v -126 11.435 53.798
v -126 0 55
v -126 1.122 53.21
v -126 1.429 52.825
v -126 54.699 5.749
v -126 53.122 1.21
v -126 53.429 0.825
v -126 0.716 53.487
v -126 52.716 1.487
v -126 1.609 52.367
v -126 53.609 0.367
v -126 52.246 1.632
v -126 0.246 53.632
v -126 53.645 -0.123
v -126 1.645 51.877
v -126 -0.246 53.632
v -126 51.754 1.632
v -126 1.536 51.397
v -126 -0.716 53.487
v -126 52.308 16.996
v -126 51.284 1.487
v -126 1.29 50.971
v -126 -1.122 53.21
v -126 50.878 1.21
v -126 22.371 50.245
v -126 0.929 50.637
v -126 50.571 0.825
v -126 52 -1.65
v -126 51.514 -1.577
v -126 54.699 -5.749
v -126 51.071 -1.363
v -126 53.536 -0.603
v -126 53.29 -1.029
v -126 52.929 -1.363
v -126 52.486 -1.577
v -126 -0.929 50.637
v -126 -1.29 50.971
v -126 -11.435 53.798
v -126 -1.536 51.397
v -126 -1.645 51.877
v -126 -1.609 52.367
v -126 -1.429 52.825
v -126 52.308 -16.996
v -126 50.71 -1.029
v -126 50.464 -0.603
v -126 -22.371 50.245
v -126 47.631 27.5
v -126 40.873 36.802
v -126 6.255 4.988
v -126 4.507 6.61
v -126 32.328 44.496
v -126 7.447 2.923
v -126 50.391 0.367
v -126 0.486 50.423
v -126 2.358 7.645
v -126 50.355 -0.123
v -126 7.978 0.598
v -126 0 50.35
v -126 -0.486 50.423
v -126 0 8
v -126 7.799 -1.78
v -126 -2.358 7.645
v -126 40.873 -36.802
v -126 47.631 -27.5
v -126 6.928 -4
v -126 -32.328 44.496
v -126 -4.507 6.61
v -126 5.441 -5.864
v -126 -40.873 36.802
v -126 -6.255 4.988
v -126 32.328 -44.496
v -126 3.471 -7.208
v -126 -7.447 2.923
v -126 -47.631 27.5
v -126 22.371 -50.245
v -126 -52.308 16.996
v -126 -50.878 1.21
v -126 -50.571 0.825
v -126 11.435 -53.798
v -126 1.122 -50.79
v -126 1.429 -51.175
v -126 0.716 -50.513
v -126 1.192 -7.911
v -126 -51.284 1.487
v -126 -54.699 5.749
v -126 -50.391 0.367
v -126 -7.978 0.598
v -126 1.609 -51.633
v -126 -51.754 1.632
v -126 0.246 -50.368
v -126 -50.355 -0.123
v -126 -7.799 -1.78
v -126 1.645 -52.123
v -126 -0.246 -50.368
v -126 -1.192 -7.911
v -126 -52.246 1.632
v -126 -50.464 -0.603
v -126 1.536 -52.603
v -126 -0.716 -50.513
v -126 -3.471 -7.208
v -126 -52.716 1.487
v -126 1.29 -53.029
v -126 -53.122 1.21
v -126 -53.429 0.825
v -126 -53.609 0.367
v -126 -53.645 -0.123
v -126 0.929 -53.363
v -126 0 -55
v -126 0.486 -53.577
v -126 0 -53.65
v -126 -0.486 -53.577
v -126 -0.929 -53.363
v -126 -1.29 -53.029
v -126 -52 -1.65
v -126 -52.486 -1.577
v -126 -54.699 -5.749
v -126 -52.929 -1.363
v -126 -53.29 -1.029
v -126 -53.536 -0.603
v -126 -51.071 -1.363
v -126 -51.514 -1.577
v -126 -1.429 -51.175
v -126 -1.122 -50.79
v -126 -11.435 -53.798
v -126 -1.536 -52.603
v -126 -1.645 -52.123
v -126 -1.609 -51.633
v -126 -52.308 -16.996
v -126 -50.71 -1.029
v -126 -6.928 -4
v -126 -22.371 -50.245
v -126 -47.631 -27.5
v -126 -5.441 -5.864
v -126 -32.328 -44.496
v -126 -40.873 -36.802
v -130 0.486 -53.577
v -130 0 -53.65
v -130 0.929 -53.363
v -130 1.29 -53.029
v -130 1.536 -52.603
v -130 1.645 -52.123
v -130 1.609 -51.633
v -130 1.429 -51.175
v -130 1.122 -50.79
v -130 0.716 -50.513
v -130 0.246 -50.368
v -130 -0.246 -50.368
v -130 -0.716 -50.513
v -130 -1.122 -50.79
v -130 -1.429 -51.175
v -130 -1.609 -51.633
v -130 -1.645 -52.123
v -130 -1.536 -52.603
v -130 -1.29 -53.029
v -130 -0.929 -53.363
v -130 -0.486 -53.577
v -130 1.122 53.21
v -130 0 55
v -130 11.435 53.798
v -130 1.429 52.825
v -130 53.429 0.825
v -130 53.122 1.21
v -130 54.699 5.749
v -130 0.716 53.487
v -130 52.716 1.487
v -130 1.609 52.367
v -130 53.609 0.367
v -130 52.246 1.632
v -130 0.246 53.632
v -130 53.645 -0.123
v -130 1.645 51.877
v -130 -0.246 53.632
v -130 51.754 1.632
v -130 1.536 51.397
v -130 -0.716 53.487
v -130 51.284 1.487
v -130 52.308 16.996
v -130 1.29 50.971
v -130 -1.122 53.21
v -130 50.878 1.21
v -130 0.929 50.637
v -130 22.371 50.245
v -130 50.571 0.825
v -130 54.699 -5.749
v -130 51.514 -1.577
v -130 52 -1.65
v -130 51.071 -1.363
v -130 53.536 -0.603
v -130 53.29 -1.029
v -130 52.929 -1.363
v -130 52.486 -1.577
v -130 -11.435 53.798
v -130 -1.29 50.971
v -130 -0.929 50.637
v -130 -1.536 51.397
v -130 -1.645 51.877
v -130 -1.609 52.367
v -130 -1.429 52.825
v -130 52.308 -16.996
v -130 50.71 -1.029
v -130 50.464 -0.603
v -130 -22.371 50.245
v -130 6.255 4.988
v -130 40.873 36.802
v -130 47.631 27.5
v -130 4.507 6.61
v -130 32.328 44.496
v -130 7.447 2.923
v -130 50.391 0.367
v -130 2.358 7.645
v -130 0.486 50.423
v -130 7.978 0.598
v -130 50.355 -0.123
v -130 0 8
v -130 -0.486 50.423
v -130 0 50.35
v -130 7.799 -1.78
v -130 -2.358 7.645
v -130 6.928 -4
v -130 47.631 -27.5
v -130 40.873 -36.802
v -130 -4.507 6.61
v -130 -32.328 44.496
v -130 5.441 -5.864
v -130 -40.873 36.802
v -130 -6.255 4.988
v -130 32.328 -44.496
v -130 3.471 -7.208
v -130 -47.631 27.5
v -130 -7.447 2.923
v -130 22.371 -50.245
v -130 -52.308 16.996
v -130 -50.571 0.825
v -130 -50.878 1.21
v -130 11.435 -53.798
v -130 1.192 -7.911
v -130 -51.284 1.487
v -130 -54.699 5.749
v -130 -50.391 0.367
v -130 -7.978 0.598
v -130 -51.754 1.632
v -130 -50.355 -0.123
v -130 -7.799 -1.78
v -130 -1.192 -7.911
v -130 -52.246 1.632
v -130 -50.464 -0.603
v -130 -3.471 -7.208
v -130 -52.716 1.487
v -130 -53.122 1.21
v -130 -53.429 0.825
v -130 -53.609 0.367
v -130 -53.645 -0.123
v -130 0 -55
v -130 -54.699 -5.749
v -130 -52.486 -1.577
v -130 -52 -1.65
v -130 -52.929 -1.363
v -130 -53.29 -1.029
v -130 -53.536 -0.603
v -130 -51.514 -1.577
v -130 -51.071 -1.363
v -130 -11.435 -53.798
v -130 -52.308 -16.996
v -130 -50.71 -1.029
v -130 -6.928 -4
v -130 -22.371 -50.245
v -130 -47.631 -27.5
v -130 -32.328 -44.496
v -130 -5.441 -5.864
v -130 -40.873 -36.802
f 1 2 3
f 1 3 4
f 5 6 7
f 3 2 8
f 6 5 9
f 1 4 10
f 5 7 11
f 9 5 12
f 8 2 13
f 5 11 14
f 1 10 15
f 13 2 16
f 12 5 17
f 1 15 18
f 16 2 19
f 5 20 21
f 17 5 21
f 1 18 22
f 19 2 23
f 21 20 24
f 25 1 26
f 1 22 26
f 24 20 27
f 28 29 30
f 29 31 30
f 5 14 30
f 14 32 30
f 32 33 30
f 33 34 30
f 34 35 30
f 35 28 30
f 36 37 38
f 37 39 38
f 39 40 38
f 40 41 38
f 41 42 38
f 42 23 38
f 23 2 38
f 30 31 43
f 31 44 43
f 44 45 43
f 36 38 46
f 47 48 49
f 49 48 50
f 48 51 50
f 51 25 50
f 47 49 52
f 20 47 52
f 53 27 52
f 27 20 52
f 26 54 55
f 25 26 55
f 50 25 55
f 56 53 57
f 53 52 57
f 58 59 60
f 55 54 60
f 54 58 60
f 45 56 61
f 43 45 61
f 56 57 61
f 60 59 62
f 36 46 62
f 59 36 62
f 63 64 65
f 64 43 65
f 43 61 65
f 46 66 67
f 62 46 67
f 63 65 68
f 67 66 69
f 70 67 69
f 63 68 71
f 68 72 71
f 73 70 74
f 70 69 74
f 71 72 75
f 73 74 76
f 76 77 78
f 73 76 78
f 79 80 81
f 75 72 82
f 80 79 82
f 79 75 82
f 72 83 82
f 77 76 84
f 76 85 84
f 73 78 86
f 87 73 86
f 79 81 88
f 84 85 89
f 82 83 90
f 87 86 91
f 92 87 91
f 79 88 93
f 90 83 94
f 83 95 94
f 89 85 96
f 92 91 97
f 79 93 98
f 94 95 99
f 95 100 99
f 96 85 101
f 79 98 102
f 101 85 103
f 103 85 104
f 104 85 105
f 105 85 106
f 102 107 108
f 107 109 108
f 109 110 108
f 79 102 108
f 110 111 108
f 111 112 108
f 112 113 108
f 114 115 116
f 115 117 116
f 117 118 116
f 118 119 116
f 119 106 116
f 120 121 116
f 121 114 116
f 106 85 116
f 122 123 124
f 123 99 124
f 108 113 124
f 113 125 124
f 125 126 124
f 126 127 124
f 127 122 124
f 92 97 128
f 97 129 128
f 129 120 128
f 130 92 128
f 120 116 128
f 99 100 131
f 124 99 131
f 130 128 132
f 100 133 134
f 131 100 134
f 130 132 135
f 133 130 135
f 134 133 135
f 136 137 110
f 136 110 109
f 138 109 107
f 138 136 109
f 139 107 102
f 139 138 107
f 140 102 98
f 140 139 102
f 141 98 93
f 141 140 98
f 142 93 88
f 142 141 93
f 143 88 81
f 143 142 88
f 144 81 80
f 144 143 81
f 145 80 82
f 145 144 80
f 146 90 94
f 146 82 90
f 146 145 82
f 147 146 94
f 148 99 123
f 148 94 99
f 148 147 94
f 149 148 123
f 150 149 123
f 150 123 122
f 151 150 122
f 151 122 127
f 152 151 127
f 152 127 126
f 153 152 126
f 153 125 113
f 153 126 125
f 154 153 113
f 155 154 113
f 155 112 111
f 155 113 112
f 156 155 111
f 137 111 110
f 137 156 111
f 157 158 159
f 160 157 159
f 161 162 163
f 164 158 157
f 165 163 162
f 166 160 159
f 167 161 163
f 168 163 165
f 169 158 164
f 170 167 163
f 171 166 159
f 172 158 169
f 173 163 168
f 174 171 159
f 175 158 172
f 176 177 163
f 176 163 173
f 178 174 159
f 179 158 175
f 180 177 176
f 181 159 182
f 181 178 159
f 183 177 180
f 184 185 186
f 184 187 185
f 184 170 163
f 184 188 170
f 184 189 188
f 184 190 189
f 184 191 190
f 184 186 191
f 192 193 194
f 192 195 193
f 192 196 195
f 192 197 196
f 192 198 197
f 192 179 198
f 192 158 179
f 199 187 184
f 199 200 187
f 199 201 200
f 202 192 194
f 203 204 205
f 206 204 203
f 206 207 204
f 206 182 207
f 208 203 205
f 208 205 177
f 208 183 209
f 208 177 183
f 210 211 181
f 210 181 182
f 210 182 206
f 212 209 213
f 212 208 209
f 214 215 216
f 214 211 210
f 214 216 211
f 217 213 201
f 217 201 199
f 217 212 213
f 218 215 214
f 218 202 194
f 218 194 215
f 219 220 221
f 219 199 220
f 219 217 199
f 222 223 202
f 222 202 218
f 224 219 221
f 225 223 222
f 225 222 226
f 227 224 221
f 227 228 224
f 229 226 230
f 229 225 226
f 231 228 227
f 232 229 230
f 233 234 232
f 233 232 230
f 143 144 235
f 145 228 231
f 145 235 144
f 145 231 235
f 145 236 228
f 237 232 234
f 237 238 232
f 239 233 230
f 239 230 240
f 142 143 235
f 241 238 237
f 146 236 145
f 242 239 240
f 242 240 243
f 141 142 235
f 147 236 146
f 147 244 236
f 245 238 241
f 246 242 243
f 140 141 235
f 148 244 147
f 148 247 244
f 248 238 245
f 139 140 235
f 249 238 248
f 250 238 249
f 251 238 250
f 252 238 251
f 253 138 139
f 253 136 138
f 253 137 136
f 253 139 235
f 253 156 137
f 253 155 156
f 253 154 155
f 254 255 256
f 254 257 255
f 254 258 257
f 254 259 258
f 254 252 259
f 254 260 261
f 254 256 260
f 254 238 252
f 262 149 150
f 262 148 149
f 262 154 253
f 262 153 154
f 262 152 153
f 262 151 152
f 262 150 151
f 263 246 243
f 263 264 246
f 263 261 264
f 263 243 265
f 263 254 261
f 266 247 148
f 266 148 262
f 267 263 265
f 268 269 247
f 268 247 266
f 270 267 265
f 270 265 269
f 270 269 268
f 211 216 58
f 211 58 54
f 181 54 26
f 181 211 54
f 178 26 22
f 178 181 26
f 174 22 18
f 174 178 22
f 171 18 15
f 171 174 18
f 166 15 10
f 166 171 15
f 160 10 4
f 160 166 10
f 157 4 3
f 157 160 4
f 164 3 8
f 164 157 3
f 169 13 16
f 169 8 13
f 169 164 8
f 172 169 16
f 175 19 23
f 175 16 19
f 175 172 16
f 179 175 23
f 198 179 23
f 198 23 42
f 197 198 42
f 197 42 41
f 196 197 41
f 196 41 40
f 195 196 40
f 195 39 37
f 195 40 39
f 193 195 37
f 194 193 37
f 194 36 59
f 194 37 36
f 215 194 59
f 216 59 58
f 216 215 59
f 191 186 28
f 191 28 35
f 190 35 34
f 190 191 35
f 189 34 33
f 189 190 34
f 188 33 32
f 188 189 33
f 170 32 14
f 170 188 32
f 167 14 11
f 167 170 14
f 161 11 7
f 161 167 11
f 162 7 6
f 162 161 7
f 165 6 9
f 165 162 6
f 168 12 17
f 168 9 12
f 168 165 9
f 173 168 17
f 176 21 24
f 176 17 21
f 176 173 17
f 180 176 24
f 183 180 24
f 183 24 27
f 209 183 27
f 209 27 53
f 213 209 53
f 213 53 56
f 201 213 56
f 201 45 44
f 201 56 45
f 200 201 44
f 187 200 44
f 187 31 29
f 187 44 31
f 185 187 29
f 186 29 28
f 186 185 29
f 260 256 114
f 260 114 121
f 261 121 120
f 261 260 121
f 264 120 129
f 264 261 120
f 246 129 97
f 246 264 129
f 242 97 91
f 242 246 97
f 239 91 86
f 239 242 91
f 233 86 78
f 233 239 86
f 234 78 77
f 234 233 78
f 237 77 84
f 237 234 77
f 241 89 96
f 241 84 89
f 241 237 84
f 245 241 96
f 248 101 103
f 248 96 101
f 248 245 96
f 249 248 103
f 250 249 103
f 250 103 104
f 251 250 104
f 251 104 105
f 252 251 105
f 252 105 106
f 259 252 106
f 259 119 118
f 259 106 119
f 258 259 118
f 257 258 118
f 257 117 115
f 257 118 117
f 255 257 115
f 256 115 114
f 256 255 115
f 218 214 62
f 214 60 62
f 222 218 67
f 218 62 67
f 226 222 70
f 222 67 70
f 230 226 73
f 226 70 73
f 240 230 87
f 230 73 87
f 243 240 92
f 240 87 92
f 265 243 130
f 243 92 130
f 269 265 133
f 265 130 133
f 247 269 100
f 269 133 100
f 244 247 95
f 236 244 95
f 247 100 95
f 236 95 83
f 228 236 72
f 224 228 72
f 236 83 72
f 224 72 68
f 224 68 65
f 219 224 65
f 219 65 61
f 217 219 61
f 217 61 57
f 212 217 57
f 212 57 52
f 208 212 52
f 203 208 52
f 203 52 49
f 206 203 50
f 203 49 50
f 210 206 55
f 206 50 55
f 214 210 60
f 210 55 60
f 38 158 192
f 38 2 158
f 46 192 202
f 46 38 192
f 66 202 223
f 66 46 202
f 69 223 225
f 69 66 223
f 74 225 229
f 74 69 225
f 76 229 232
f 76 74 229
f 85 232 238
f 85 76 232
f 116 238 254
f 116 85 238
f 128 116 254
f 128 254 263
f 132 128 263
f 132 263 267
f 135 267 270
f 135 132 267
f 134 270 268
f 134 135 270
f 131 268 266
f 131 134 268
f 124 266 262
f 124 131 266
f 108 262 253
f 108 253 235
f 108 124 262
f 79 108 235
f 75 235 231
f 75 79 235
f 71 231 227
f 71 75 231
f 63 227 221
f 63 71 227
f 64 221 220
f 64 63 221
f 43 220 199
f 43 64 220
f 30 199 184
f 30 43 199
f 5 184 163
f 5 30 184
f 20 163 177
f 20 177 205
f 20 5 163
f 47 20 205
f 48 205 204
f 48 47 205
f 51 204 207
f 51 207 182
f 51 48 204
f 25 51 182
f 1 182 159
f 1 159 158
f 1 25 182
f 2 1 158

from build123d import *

# Parameters (mm, degrees)
AXIAL_PROFILE_MM_W     = 4
AXIAL_PROFILE_MM_H     = 47
AXIAL_HOLES_DEPTH      = 152.492574075
AXIAL_HOLES_DEPTH_BACK = 152.492574075
SKETCH2_R              = 1.65


with BuildPart() as part:
    # Axial profile (mm) → Full revolution (revolve)
    with BuildSketch(Plane.XY, mode=Mode.PRIVATE) as full_revolution_sk:
        with Locations((-128, 31.5)):
            Rectangle(AXIAL_PROFILE_MM_W, AXIAL_PROFILE_MM_H)
    revolve(full_revolution_sk.sketch.rotate(Axis((-110, 0, 0), (1, 0, 0)), 90), axis=Axis((-110, 0, 0), (1, 0, 0)))

    # Sketch2 → Axial holes (cut, two sides: drawn at the far end of the back side and taken through both)
    with BuildSketch(Plane(origin=(0, 0, 0), x_dir=(0, 0, -1), z_dir=(1, 0, 0)).offset(-AXIAL_HOLES_DEPTH_BACK)):
        with Locations((0, 52)):
            Circle(SKETCH2_R)
        with Locations((-52, 0)):
            Circle(SKETCH2_R)
        with Locations((0, -52)):
            Circle(SKETCH2_R)
        with Locations((52, 0)):
            Circle(SKETCH2_R)
    extrude(amount=AXIAL_HOLES_DEPTH + AXIAL_HOLES_DEPTH_BACK, mode=Mode.SUBTRACT)


solid = part.part
